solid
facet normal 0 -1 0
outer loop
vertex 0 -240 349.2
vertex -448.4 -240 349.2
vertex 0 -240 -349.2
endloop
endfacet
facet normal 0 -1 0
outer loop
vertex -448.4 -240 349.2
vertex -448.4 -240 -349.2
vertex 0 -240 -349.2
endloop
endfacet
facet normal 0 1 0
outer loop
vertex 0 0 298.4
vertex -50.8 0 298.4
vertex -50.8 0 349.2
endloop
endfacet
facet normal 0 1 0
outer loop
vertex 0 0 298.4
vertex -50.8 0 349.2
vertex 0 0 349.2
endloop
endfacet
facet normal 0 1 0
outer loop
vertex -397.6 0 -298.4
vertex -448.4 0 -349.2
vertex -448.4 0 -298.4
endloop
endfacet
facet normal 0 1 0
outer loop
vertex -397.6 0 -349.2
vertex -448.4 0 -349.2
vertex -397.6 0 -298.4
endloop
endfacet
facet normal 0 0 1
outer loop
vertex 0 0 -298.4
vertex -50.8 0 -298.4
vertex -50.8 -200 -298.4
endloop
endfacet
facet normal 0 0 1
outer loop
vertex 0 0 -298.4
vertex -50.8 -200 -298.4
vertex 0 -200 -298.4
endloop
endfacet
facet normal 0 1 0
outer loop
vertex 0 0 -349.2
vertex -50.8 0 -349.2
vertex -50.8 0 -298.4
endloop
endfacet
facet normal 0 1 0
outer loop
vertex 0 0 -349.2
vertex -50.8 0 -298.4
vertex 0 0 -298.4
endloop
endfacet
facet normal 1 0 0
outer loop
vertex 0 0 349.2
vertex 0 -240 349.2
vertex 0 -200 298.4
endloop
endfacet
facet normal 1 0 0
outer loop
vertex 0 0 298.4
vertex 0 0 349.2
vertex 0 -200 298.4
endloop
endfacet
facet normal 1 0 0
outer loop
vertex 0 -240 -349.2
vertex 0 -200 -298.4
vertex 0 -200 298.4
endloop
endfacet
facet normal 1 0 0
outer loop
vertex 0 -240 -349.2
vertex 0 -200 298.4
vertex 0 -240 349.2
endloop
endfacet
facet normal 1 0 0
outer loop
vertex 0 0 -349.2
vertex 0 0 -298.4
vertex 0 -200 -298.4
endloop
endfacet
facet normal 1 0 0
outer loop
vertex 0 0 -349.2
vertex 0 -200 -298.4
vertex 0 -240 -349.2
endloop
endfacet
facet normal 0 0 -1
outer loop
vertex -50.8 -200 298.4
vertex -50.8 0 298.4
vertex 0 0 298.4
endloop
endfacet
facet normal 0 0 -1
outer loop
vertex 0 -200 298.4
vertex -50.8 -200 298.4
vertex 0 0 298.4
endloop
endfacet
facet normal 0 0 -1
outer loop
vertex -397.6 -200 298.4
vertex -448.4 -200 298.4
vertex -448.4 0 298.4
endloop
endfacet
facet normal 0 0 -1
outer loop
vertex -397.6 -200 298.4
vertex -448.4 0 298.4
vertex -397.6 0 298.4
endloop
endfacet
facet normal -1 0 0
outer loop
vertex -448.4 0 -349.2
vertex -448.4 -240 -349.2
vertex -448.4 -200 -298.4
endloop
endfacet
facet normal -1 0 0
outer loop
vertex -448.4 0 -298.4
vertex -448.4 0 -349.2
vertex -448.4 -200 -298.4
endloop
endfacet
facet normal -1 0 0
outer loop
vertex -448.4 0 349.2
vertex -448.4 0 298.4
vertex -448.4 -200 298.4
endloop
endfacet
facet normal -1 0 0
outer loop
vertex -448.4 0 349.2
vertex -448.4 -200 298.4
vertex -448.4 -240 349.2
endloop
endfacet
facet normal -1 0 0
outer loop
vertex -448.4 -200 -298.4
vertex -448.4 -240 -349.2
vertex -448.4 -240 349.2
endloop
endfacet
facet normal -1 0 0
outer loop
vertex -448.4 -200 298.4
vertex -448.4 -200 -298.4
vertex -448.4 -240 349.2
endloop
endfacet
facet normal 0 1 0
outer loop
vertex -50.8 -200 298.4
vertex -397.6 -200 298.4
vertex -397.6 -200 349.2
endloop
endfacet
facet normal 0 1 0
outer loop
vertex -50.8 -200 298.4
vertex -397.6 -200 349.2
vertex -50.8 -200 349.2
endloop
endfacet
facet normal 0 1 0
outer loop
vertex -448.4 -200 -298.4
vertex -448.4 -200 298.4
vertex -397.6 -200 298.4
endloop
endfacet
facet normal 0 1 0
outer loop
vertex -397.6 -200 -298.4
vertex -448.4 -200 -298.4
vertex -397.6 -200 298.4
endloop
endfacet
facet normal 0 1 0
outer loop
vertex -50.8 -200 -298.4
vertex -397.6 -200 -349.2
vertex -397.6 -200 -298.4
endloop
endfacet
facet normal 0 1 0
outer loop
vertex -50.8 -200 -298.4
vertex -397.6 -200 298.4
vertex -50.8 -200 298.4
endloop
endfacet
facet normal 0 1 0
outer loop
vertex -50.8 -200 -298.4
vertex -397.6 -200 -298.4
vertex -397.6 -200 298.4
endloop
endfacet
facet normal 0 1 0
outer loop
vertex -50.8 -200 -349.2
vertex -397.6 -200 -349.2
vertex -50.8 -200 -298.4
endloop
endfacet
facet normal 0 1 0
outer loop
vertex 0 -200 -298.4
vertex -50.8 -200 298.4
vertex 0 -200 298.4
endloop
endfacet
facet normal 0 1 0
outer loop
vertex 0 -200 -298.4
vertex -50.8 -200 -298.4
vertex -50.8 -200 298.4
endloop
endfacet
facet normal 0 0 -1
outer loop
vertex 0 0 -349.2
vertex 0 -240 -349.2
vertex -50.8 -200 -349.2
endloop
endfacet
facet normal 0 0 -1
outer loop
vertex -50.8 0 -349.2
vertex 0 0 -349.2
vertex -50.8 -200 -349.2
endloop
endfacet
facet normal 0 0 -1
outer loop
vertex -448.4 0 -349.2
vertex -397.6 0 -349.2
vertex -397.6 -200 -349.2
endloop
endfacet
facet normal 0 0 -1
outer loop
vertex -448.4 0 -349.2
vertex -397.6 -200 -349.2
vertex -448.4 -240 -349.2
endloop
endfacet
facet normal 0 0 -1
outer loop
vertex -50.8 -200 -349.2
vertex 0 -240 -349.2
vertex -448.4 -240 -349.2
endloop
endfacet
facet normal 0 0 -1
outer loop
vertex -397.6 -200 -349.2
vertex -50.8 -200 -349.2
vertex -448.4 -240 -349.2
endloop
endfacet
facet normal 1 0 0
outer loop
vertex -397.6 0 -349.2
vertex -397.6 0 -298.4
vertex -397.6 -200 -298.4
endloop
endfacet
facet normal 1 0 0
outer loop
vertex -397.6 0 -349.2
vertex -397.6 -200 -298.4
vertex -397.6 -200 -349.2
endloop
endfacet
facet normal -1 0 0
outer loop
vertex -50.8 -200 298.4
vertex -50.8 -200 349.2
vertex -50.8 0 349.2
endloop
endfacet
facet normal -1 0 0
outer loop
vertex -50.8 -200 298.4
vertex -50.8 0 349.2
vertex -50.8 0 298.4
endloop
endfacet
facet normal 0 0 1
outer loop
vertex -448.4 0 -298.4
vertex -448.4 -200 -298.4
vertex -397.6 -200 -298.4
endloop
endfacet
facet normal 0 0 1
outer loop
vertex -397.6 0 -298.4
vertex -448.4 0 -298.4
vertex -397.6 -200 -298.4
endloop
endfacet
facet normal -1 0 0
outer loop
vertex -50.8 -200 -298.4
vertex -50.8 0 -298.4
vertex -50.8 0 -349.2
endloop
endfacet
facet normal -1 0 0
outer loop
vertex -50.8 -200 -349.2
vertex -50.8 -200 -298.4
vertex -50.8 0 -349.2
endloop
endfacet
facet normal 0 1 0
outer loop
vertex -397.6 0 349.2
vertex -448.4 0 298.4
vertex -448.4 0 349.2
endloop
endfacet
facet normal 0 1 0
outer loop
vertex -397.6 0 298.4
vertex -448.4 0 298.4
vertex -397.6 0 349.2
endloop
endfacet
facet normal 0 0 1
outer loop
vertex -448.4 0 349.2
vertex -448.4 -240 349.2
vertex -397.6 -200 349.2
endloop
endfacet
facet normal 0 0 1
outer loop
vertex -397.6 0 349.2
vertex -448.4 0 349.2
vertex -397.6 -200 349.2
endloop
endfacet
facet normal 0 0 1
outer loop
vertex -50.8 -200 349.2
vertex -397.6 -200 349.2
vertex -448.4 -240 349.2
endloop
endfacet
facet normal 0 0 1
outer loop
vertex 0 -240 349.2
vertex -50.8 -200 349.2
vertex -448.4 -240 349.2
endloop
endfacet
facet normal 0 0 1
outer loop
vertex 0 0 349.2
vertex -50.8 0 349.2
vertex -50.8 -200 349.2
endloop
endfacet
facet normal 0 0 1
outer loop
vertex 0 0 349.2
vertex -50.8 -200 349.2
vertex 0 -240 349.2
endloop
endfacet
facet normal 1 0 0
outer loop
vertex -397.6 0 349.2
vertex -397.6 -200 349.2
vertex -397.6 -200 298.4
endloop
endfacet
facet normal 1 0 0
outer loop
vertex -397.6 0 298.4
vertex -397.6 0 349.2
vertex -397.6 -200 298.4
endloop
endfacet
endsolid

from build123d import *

# Parameters (mm, degrees)
CROQUIS1_4_W              = 50.8
CROQUIS1_4_H              = 50.8
SALIENTE_EXTRUIR3_DEPTH   = 240
SALIENTE_EXTRUIR3_2_DEPTH = 240
SALIENTE_EXTRUIR3_3_DEPTH = 240
SALIENTE_EXTRUIR3_4_DEPTH = 240
SALIENTE_EXTRUIR4_START   = -240
CROQUIS1_5_W              = 346.8
CROQUIS1_5_H              = 596.8
CROQUIS1_5_W_2            = 50.8
CROQUIS1_5_H_2            = 50.8
SALIENTE_EXTRUIR4_DEPTH   = 40


with BuildPart() as part:
    # Croquis1<4> → Saliente-Extruir3 (new body)
    with BuildSketch(Plane(origin=(0, 0, 0), x_dir=(1, 0, 0), z_dir=(0, 1, 0))):
        with Locations((-423, -323.8)):
            Rectangle(CROQUIS1_4_W, CROQUIS1_4_H)
    extrude(amount=-SALIENTE_EXTRUIR3_DEPTH)



with BuildPart() as body_2:
    # Croquis1<4> → Saliente-Extruir3 2 (new body)
    with BuildSketch(Plane(origin=(0, 0, 0), x_dir=(1, 0, 0), z_dir=(0, 1, 0))):
        with Locations((-423, 323.8)):
            Rectangle(CROQUIS1_4_W, CROQUIS1_4_H)
    extrude(amount=-SALIENTE_EXTRUIR3_2_DEPTH)


with BuildPart() as body_3:
    # Croquis1<4> → Saliente-Extruir3 3 (new body)
    with BuildSketch(Plane(origin=(0, 0, 0), x_dir=(1, 0, 0), z_dir=(0, 1, 0))):
        with Locations((-25.4, 323.8)):
            Rectangle(CROQUIS1_4_W, CROQUIS1_4_H)
    extrude(amount=-SALIENTE_EXTRUIR3_3_DEPTH)


with BuildPart() as body_4:
    # Croquis1<4> → Saliente-Extruir3 4 (new body)
    with BuildSketch(Plane(origin=(0, 0, 0), x_dir=(1, 0, 0), z_dir=(0, 1, 0))):
        with Locations((-25.4, -323.8)):
            Rectangle(CROQUIS1_4_W, CROQUIS1_4_H)
    extrude(amount=-SALIENTE_EXTRUIR3_4_DEPTH)


with BuildPart() as part_1:
    add(part.part)

    add(body_2.part)  # Saliente-Extruir4 merges body 2

    add(body_3.part)  # Saliente-Extruir4 merges body 3

    add(body_4.part)  # Saliente-Extruir4 merges body 4
    # Croquis1<5> → Saliente-Extruir4 (add)
    with BuildSketch(Plane(origin=(0, 0, 0), x_dir=(1, 0, 0), z_dir=(0, 1, 0)).offset(SALIENTE_EXTRUIR4_START)):
        with Locations((-224.2, 0)):
            Rectangle(CROQUIS1_5_W, CROQUIS1_5_H)
        with Locations((-25.4, 0)):
            Rectangle(CROQUIS1_5_W_2, CROQUIS1_5_H)
        with Locations((-224.2, -323.8)):
            Rectangle(CROQUIS1_5_W, CROQUIS1_5_H_2)
        with Locations((-423, 0)):
            Rectangle(CROQUIS1_5_W_2, CROQUIS1_5_H)
        with Locations((-224.2, 323.8)):
            Rectangle(CROQUIS1_5_W, CROQUIS1_5_H_2)
        with Locations((-423, 323.8)):
            Rectangle(CROQUIS1_5_W_2, CROQUIS1_5_H_2)
        with Locations((-25.4, 323.8)):
            Rectangle(CROQUIS1_5_W_2, CROQUIS1_5_H_2)
        with Locations((-25.4, -323.8)):
            Rectangle(CROQUIS1_5_W_2, CROQUIS1_5_H_2)
        with Locations((-423, -323.8)):
            Rectangle(CROQUIS1_5_W_2, CROQUIS1_5_H_2)
    extrude(amount=SALIENTE_EXTRUIR4_DEPTH)


solid = part_1.part
